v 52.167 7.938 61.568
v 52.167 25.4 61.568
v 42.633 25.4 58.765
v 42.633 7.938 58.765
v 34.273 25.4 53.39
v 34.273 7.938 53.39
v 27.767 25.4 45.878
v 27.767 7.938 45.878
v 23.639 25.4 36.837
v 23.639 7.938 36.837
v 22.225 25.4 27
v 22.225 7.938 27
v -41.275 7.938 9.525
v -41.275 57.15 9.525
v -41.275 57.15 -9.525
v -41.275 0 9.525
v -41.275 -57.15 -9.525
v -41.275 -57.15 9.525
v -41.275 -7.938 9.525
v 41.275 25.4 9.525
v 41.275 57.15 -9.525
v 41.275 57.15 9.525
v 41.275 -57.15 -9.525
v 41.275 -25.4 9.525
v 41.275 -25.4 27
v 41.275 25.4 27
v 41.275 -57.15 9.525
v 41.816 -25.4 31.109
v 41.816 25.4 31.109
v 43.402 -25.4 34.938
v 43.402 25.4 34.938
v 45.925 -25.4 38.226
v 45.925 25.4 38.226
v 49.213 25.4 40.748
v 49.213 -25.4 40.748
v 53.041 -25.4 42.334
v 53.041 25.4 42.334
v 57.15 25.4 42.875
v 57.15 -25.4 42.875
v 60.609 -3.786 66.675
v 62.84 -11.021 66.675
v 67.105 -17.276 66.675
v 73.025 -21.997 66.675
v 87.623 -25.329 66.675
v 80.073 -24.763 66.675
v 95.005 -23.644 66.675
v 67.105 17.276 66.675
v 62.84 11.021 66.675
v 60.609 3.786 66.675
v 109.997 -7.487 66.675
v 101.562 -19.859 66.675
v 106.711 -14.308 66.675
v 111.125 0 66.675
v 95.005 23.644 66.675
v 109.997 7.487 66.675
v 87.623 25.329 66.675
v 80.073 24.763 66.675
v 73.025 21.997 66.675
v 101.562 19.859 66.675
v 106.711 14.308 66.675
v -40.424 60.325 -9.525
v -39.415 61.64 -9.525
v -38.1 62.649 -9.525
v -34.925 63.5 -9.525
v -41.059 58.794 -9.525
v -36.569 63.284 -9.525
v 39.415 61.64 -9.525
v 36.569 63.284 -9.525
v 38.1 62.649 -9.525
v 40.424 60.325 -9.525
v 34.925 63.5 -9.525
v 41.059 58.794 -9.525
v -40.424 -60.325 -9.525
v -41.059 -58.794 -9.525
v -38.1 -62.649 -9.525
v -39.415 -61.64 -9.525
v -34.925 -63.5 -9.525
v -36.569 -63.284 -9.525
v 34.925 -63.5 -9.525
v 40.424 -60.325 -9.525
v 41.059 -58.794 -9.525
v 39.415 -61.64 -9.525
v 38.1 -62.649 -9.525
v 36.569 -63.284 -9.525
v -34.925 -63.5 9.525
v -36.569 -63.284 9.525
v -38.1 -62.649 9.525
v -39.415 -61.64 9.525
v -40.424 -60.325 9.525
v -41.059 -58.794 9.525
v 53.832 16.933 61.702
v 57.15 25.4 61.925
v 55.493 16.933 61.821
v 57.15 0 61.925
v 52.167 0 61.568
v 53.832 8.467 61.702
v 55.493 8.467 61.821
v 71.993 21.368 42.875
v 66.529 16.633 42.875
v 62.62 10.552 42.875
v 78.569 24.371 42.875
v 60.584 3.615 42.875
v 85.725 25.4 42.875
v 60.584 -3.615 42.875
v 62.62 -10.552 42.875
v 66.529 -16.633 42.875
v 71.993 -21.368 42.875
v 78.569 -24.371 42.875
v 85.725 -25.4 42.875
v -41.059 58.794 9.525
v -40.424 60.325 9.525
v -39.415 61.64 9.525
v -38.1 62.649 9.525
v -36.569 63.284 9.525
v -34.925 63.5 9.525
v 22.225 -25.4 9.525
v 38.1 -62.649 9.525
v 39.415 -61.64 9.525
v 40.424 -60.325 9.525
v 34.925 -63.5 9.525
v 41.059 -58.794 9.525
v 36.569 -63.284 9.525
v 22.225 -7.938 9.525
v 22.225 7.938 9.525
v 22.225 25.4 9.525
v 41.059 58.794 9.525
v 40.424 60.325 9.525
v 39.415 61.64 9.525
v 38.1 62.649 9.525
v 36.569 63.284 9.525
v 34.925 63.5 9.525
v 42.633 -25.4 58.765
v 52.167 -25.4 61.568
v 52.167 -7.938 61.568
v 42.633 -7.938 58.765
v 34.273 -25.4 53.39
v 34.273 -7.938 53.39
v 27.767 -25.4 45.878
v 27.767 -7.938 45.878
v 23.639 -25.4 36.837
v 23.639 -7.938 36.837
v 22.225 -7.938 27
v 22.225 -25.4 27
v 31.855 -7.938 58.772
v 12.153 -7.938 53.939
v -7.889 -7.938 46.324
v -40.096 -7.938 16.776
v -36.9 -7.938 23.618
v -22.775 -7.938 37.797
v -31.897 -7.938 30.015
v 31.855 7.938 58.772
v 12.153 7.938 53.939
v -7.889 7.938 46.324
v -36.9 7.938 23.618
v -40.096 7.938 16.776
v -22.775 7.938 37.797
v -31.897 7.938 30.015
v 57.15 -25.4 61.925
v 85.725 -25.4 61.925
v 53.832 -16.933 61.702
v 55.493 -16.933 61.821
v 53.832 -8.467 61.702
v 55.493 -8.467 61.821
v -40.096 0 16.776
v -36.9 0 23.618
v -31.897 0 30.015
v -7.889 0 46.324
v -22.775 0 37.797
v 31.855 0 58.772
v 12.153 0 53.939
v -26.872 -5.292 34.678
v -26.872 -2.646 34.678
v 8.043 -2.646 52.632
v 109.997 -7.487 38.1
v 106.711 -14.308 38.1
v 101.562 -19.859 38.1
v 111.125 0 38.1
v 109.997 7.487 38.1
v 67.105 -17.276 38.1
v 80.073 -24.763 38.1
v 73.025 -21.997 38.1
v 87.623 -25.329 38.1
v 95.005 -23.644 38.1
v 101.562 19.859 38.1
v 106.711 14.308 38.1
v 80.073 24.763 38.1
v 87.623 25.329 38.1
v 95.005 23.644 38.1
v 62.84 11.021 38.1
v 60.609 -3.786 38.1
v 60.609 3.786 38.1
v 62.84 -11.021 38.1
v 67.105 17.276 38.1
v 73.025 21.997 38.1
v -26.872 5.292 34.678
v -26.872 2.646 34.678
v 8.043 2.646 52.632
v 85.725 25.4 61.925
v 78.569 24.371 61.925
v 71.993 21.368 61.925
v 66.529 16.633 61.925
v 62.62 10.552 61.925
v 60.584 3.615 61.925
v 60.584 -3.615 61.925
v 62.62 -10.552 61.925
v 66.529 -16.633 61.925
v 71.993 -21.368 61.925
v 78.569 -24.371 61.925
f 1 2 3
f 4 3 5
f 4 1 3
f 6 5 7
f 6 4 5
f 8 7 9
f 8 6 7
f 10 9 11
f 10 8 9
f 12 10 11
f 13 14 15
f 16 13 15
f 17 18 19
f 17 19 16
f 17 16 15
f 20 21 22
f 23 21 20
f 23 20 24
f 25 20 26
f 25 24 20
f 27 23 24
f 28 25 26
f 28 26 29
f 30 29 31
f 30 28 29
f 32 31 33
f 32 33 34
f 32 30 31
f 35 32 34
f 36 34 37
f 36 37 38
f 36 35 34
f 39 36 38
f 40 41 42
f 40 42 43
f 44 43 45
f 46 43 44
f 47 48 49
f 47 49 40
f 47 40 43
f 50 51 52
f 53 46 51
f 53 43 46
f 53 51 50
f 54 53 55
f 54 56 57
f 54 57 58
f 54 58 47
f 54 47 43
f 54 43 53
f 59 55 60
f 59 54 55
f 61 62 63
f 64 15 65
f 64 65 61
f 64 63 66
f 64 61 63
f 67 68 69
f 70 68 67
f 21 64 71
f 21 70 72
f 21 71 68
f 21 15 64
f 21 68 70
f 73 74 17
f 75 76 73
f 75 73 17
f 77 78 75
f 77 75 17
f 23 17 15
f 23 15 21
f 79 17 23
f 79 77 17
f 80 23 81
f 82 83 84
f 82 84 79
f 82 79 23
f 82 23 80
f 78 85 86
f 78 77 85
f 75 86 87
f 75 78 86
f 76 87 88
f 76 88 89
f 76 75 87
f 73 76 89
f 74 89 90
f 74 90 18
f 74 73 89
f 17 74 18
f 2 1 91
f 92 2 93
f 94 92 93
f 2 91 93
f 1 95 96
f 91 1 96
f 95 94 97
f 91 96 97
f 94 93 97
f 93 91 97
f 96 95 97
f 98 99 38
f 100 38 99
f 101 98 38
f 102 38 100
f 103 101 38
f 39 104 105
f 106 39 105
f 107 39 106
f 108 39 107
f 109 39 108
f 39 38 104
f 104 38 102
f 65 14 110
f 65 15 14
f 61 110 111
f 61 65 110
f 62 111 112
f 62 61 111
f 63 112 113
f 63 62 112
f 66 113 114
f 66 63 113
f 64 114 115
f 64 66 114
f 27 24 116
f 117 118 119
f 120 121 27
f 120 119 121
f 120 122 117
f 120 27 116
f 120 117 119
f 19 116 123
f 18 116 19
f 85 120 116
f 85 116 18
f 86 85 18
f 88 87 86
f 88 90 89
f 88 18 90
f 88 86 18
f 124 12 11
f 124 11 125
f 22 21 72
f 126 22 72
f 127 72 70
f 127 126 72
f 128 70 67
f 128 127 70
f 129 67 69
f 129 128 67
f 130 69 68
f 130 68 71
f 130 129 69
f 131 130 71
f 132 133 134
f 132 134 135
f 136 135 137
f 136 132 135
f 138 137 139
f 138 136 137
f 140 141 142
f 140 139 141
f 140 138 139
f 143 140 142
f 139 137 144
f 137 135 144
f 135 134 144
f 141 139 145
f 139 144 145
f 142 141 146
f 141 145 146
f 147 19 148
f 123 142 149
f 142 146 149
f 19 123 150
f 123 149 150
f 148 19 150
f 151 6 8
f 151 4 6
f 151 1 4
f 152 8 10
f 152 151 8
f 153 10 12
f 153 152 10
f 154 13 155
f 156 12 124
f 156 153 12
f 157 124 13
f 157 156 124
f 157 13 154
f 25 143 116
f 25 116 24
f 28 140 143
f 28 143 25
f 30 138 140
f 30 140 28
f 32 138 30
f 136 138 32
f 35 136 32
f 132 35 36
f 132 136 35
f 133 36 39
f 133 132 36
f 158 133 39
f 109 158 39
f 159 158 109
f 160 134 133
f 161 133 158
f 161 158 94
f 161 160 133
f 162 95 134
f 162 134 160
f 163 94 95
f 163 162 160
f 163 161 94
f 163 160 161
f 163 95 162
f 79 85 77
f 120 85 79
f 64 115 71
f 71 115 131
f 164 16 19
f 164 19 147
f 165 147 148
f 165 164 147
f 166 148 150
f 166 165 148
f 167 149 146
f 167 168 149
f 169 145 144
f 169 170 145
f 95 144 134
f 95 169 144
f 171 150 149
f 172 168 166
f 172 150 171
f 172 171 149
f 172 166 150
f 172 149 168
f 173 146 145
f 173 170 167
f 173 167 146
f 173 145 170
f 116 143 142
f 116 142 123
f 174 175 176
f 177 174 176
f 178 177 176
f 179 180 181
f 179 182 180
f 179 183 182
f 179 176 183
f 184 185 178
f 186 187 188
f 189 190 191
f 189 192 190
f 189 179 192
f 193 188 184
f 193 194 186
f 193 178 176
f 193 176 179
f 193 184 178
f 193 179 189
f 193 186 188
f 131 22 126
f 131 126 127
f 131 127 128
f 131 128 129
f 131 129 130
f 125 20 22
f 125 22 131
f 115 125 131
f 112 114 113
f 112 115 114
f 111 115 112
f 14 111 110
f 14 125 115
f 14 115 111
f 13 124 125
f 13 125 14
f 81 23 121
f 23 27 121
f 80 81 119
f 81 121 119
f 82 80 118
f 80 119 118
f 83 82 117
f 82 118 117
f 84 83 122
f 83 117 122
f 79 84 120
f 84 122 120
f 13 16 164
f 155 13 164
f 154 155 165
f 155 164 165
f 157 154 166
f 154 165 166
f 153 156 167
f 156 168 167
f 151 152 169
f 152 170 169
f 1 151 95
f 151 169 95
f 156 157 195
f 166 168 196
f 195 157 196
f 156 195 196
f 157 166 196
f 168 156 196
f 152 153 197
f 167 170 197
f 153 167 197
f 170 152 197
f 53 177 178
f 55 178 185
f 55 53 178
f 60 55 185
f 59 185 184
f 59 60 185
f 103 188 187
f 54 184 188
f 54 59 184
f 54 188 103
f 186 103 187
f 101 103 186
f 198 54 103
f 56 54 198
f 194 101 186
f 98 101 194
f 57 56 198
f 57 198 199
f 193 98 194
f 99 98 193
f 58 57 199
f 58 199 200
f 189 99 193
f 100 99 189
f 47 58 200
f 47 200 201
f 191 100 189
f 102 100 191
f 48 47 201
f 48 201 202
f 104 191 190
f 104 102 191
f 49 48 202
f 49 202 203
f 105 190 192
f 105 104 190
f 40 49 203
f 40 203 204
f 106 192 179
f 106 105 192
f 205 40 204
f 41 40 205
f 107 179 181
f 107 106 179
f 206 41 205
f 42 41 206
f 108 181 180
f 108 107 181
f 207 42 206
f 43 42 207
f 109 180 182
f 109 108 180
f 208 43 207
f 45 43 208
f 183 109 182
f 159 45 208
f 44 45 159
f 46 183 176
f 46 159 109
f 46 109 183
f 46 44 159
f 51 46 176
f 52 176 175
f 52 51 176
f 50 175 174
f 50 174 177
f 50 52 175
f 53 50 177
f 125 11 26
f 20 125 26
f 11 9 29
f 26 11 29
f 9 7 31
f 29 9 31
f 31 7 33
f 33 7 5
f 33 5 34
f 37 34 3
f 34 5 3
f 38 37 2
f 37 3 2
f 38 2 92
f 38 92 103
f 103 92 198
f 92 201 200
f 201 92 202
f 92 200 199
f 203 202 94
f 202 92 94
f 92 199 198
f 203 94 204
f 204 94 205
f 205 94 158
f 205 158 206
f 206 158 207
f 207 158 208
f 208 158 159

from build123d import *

# Parameters (mm, degrees)
F1_DEPTH = 63.5
F2_DEPTH = 25.4
F3_DEPTH = 7.9375
F0_W     = 25.4
F0_H     = 19.05
F4_DEPTH = 25.4
F6_R     = 6.35


with BuildPart() as f1:
    # F0 (on Front) → F1 (new body, symmetric)
    with BuildSketch(Plane.XZ):
        Polygon((22.225, 9.525), (-41.275, 9.525), (-41.275, -9.525), (41.275, -9.525), (41.275, 9.525), align=None)
    extrude(amount=F1_DEPTH, both=True)

    # F0 (on Front) → F2 (join, symmetric)
    with BuildSketch(Plane.XZ):
        with BuildLine():
            Line((22.225, 27.0002), (22.225, 9.525))
            Line((22.225, 9.525), (41.275, 9.525))
            Line((41.275, 9.525), (41.275, 27.0002))
            ThreePointArc((41.275, 27.0002), (45.9246798487, 38.2255201513), (57.15, 42.8752))
            Line((57.15, 42.8752), (60.325, 42.8752))
            Line((60.325, 42.8752), (60.325, 61.9252))
            Line((60.325, 61.9252), (57.15, 61.9252))
            add(Edge.make_bspline(
                [(52.1673264767, 61.5679391445), (53.8333829915, 61.7094866202), (55.4951364751, 61.8287124743), (57.15, 61.9252)],
                knots=[107.5205143307, 107.5205143307, 107.5205143307, 107.5205143307, 111.5045361635, 111.5045361635, 111.5045361635, 111.5045361635], degree=3))
            ThreePointArc((52.1673264767, 61.5679391445), (30.7513684275, 49.8665043822), (22.225, 27.0002))
        make_face()
    extrude(amount=F2_DEPTH, both=True)

    # F0 (on Front) → F3 (join, symmetric)
    with BuildSketch(Plane.XZ):
        with BuildLine():
            add(Edge.make_bspline(
                [(-41.275, 9.525), (-40.8936231026, 37.6698712219), (7.2039048673, 57.7478653509), (52.1673264767, 61.5679391445)],
                knots=[0, 0, 0, 0, 107.5205143307, 107.5205143307, 107.5205143307, 107.5205143307], degree=3))
            Line((-41.275, 9.525), (22.225, 9.525))
            Line((22.225, 9.525), (22.225, 27.0002))
            ThreePointArc((22.225, 27.0002), (30.7513684275, 49.8665043822), (52.1673264767, 61.5679391445))
        make_face()
    extrude(amount=F3_DEPTH, both=True)

    # F0 (on Front) → F4 (join, symmetric)
    with BuildSketch(Plane.XZ):
        with Locations((73.025, 52.4002)):
            Rectangle(F0_W, F0_H)
    extrude(amount=F4_DEPTH, both=True)

    # F0 (on Front) → F5 (revolve)
    with BuildSketch(Plane.XZ):
        Polygon((85.725, 66.675), (85.725, 61.9252), (85.725, 42.8752), (85.725, 38.1), (111.125, 38.1), (111.125, 66.675), align=None)
    revolve(axis=Axis((85.725, 0, 52.3875), (0, 0, 1)))

    # F6
    f6_edges = [f1.edges().sort_by_distance(p)[0] for p in [
        (-41.275, -63.5, 0),
        (41.275, -63.5, 0),
        (41.275, 63.5, 0),
        (-41.275, 63.5, 0),
    ]]
    fillet(f6_edges, radius=F6_R)


solid = f1.part
